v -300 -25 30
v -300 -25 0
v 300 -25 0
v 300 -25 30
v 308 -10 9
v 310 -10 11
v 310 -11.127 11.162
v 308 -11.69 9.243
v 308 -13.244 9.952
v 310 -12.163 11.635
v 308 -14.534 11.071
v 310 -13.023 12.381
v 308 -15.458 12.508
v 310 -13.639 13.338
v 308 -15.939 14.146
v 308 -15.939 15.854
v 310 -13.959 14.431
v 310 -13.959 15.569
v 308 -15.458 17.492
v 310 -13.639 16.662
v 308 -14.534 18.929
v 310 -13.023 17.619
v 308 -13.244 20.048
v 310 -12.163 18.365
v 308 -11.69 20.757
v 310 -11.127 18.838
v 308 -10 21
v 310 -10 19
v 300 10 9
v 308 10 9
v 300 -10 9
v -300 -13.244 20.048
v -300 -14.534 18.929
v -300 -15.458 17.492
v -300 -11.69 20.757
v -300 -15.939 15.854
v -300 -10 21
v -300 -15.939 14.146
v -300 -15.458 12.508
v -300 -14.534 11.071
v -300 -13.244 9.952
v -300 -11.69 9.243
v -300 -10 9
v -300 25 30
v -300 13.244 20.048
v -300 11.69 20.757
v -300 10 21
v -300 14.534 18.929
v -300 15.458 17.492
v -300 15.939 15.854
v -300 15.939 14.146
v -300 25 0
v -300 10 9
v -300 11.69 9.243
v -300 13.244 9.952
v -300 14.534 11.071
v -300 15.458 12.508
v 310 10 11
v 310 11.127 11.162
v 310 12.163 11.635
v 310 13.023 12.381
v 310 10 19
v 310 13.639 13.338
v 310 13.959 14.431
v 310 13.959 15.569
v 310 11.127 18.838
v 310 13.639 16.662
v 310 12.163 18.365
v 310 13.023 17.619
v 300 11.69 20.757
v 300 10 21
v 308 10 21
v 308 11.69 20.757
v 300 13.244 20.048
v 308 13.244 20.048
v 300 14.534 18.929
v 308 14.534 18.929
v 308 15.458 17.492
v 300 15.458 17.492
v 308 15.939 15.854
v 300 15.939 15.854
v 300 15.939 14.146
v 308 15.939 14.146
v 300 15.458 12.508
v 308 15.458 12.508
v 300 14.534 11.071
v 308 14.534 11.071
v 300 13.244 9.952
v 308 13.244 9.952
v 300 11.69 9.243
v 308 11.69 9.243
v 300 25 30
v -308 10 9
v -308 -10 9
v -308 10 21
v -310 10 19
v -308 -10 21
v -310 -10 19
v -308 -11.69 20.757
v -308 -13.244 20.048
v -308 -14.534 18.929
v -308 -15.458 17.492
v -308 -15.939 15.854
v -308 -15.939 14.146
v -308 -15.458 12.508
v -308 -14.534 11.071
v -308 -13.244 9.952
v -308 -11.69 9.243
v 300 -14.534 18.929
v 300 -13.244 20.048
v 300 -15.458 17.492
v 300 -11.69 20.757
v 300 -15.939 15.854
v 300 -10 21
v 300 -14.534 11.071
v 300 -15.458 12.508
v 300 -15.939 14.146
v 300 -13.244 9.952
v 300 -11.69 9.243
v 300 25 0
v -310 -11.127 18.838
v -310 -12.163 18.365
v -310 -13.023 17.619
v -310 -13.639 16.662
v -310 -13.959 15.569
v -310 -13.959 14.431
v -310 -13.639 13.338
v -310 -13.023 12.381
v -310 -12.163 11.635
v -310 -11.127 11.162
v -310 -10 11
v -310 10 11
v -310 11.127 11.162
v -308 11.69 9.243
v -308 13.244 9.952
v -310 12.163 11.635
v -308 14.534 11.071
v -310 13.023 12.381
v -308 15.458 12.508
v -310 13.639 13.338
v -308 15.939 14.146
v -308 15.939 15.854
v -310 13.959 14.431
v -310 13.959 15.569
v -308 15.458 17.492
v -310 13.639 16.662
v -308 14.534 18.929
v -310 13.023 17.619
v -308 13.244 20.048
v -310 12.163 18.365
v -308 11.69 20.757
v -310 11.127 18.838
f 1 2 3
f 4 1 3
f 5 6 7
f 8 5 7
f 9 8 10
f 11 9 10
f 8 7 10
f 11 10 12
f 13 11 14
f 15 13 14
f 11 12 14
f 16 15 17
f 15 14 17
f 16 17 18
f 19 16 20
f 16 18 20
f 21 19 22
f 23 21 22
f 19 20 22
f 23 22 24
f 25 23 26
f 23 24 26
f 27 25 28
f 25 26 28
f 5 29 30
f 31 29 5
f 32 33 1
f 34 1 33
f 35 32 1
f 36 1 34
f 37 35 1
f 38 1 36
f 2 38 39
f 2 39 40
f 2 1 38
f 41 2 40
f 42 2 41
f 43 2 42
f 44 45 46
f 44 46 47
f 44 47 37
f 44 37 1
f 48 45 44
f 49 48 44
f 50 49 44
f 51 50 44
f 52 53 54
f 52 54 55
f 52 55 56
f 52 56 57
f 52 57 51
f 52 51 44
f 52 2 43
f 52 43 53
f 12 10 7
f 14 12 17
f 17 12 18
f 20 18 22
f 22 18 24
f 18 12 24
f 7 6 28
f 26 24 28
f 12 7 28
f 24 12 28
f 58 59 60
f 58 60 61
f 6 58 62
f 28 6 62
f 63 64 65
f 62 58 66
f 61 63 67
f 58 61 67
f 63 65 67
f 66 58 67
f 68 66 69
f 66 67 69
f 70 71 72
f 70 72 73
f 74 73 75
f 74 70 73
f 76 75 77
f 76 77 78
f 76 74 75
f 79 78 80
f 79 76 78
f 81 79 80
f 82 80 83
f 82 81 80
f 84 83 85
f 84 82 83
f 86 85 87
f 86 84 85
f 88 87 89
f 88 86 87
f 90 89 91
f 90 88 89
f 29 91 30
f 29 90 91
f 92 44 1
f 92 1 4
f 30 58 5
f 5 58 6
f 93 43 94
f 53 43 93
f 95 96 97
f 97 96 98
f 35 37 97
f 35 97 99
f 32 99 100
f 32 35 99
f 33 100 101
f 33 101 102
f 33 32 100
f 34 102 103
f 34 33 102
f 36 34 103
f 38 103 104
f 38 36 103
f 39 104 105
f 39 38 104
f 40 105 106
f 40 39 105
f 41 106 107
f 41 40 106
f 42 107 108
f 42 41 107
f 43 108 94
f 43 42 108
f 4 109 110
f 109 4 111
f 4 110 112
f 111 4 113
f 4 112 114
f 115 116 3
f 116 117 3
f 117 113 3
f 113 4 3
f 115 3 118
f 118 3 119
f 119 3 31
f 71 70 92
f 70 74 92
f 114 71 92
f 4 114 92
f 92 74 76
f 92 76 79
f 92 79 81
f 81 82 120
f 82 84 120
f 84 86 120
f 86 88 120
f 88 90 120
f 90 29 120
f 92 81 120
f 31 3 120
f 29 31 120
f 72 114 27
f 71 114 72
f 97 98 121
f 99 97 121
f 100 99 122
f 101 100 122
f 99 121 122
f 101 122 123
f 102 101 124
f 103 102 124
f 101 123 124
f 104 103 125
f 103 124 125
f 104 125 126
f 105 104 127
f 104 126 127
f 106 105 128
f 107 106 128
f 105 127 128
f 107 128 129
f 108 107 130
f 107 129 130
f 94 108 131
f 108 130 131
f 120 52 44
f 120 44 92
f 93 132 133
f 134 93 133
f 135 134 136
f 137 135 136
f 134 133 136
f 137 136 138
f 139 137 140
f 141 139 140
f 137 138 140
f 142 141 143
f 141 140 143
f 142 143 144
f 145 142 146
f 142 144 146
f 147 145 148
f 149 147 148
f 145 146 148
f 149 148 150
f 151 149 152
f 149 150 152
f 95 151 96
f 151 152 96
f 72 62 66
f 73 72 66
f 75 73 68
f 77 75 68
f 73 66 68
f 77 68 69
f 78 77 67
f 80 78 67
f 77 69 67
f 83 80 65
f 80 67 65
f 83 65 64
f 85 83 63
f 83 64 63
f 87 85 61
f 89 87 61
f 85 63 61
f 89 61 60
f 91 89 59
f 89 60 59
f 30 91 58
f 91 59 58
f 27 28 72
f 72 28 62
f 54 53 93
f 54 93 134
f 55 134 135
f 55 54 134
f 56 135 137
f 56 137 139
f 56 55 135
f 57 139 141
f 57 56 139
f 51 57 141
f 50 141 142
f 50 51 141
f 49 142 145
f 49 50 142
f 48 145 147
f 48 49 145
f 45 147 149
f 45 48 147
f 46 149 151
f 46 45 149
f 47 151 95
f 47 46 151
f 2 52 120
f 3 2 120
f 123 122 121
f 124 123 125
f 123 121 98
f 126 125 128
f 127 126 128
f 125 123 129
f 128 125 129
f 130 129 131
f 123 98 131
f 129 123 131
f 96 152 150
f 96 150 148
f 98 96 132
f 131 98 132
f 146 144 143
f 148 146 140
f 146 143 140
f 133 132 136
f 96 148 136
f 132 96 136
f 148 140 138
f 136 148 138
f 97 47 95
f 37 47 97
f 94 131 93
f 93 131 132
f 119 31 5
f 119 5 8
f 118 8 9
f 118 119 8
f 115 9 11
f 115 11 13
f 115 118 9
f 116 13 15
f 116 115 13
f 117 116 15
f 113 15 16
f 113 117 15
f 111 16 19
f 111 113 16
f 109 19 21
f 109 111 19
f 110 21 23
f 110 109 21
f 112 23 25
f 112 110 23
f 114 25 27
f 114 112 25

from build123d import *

# Parameters (mm, degrees)
ESQUISSE1_W        = 600
ESQUISSE1_H        = 50
BOSS_EXTRU_1_DEPTH = 30
BOSS_EXTRU_2_DEPTH = 10
CHANFREIN1_SIZE    = 2
BOSS_EXTRU_3_DEPTH = 10
CHANFREIN2_SIZE    = 2


with BuildPart() as part:
    # Esquisse1 → Boss.-Extru.1 (new body)
    with BuildSketch(Plane.XY):
        Rectangle(ESQUISSE1_W, ESQUISSE1_H)
    extrude(amount=BOSS_EXTRU_1_DEPTH)

    # Esquisse2 → Boss.-Extru.2 (add)
    with BuildSketch(Plane(origin=(300, 0, 0), x_dir=(0, 0, -1), z_dir=(1, 0, 0))):
        with BuildLine():
            Line((-9, 10), (-9, -10))
            ThreePointArc((-9, -10), (-15, -16), (-21, -10))
            Line((-21, -10), (-21, 10))
            ThreePointArc((-21, 10), (-15, 16), (-9, 10))
        make_face()
    extrude(amount=BOSS_EXTRU_2_DEPTH)

    # Chanfrein1
    chanfrein1_edges = [part.edges().sort_by_distance(p)[0] for p in [
        (310, 16, 15),
        (310, 0, 21),
        (310, -16, 15),
        (310, 0, 9),
    ]]
    chamfer(chanfrein1_edges, length=CHANFREIN1_SIZE)

    # Esquisse3 → Boss.-Extru.3 (add)
    with BuildSketch(Plane.ZY.offset(300)):
        with BuildLine():
            Line((21, 10), (21, -10))
            ThreePointArc((21, -10), (15, -16), (9, -10))
            Line((9, -10), (9, 10))
            ThreePointArc((9, 10), (15, 16), (21, 10))
        make_face()
    extrude(amount=BOSS_EXTRU_3_DEPTH)

    # Chanfrein2
    chanfrein2_edges = [part.edges().sort_by_distance(p)[0] for p in [
        (-310, 0, 21),
        (-310, 16, 15),
        (-310, 0, 9),
        (-310, -16, 15),
    ]]
    chamfer(chanfrein2_edges, length=CHANFREIN2_SIZE)


solid = part.part
